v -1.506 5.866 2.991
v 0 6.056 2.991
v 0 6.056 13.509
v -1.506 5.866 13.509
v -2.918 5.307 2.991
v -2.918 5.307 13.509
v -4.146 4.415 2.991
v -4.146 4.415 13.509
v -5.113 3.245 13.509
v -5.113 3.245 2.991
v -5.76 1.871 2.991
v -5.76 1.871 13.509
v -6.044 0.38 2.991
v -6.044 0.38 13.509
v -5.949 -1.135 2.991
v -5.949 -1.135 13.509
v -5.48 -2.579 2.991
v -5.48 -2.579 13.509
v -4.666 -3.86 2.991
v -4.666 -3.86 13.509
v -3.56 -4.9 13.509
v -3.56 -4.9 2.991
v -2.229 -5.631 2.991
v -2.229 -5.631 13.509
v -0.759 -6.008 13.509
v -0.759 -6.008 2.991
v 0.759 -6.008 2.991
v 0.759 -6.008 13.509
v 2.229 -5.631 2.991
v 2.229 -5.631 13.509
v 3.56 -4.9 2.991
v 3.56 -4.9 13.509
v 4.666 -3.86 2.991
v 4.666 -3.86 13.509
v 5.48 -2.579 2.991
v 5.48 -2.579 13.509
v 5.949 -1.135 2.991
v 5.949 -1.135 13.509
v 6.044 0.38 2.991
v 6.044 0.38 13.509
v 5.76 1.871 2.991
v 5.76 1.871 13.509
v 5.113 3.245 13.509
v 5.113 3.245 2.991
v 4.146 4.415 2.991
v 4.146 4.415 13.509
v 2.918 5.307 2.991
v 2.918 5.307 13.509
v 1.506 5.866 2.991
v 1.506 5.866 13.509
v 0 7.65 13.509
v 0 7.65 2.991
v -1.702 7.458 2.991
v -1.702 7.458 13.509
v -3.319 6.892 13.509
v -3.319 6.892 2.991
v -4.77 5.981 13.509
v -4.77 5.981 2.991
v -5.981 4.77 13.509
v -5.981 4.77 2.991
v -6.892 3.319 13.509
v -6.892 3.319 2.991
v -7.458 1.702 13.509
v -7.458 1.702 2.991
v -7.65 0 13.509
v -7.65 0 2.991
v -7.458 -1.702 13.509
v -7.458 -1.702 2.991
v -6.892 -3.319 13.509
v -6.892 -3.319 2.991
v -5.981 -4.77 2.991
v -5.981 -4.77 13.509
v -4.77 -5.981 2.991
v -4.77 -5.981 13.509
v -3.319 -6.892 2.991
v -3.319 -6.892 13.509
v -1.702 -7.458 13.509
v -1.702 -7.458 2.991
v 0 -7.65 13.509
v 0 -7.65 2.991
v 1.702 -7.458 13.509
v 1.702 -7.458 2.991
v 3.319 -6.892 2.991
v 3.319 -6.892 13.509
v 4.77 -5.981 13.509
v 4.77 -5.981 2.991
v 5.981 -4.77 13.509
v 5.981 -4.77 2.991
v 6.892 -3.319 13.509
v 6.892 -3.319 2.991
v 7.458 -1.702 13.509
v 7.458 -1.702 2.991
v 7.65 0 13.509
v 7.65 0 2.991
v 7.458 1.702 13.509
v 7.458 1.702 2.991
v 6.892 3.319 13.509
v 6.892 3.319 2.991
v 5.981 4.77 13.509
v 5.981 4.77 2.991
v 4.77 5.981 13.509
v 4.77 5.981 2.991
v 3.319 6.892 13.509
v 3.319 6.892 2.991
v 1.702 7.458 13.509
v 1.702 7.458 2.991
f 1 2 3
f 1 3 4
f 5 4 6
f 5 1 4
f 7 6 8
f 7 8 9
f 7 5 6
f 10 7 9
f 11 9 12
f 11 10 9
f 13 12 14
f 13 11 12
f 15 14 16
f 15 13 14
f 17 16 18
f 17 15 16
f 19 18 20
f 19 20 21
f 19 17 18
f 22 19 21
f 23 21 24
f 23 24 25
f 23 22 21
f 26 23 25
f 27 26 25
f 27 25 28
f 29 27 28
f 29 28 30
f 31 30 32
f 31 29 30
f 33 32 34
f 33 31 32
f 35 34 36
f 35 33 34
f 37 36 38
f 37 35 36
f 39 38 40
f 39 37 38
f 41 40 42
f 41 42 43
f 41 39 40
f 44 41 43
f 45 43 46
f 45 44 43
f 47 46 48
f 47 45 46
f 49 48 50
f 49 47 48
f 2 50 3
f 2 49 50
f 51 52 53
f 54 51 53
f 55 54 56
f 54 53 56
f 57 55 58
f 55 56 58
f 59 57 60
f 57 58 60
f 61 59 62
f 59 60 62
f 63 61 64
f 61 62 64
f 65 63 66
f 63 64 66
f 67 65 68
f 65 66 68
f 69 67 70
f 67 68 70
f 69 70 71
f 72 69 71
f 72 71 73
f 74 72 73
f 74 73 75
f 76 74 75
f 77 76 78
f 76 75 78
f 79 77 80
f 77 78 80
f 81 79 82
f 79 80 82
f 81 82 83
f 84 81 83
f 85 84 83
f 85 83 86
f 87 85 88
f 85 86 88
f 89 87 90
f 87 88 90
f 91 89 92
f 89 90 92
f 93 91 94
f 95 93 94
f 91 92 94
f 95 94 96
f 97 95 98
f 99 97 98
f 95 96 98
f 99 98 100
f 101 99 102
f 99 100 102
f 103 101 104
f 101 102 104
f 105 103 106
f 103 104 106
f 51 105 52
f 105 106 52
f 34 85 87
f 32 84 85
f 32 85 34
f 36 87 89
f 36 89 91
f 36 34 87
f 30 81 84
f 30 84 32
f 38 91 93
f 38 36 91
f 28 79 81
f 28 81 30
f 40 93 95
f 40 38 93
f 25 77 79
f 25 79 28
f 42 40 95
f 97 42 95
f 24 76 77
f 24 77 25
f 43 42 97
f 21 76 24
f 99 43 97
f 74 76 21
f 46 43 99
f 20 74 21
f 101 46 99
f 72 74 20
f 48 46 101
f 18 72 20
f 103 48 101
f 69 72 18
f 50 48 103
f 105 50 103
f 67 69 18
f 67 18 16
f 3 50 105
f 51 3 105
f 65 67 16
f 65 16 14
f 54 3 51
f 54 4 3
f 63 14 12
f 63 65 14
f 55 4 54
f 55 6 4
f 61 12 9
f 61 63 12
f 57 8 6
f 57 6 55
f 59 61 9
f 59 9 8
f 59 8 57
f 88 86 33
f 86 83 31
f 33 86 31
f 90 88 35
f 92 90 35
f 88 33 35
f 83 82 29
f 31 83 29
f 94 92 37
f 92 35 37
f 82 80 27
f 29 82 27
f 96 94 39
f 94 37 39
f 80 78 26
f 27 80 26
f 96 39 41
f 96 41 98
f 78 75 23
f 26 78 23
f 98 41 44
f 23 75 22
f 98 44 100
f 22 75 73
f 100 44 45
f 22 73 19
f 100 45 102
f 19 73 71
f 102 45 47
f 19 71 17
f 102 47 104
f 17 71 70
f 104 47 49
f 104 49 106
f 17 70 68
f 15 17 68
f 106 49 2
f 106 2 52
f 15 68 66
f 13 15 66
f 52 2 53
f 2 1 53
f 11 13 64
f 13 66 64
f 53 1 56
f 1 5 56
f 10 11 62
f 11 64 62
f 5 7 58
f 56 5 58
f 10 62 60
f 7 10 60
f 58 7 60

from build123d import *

# Parameters (mm, degrees)
SKETCH1_R           = 12
SKETCH1_R_2         = 9.5
BOSS_EXTRUDE1_DEPTH = 16.5
SCALE1_SCALE        = 0.75
SCALE2_SCALE        = 0.85


with BuildPart() as part:
    # Sketch1 → Boss-Extrude1 (new body)
    with BuildSketch(Plane(origin=(0, 0, 0), x_dir=(0, 1, 0), z_dir=(0, 0, 1))):
        Circle(SKETCH1_R)
        Circle(SKETCH1_R_2, mode=Mode.SUBTRACT)
    extrude(amount=BOSS_EXTRUDE1_DEPTH)


with BuildPart() as part_1:
    # Scale1: scaled about (0, 0, 8.25)
    add(part.part.scale(SCALE1_SCALE).moved(Location((0, 0, 2.0625))))


with BuildPart() as part_2:
    # Scale2: scaled about (0, 0, 8.25)
    add(part_1.part.scale(SCALE2_SCALE).moved(Location((0, 0, 1.2375))))


solid = part_2.part
